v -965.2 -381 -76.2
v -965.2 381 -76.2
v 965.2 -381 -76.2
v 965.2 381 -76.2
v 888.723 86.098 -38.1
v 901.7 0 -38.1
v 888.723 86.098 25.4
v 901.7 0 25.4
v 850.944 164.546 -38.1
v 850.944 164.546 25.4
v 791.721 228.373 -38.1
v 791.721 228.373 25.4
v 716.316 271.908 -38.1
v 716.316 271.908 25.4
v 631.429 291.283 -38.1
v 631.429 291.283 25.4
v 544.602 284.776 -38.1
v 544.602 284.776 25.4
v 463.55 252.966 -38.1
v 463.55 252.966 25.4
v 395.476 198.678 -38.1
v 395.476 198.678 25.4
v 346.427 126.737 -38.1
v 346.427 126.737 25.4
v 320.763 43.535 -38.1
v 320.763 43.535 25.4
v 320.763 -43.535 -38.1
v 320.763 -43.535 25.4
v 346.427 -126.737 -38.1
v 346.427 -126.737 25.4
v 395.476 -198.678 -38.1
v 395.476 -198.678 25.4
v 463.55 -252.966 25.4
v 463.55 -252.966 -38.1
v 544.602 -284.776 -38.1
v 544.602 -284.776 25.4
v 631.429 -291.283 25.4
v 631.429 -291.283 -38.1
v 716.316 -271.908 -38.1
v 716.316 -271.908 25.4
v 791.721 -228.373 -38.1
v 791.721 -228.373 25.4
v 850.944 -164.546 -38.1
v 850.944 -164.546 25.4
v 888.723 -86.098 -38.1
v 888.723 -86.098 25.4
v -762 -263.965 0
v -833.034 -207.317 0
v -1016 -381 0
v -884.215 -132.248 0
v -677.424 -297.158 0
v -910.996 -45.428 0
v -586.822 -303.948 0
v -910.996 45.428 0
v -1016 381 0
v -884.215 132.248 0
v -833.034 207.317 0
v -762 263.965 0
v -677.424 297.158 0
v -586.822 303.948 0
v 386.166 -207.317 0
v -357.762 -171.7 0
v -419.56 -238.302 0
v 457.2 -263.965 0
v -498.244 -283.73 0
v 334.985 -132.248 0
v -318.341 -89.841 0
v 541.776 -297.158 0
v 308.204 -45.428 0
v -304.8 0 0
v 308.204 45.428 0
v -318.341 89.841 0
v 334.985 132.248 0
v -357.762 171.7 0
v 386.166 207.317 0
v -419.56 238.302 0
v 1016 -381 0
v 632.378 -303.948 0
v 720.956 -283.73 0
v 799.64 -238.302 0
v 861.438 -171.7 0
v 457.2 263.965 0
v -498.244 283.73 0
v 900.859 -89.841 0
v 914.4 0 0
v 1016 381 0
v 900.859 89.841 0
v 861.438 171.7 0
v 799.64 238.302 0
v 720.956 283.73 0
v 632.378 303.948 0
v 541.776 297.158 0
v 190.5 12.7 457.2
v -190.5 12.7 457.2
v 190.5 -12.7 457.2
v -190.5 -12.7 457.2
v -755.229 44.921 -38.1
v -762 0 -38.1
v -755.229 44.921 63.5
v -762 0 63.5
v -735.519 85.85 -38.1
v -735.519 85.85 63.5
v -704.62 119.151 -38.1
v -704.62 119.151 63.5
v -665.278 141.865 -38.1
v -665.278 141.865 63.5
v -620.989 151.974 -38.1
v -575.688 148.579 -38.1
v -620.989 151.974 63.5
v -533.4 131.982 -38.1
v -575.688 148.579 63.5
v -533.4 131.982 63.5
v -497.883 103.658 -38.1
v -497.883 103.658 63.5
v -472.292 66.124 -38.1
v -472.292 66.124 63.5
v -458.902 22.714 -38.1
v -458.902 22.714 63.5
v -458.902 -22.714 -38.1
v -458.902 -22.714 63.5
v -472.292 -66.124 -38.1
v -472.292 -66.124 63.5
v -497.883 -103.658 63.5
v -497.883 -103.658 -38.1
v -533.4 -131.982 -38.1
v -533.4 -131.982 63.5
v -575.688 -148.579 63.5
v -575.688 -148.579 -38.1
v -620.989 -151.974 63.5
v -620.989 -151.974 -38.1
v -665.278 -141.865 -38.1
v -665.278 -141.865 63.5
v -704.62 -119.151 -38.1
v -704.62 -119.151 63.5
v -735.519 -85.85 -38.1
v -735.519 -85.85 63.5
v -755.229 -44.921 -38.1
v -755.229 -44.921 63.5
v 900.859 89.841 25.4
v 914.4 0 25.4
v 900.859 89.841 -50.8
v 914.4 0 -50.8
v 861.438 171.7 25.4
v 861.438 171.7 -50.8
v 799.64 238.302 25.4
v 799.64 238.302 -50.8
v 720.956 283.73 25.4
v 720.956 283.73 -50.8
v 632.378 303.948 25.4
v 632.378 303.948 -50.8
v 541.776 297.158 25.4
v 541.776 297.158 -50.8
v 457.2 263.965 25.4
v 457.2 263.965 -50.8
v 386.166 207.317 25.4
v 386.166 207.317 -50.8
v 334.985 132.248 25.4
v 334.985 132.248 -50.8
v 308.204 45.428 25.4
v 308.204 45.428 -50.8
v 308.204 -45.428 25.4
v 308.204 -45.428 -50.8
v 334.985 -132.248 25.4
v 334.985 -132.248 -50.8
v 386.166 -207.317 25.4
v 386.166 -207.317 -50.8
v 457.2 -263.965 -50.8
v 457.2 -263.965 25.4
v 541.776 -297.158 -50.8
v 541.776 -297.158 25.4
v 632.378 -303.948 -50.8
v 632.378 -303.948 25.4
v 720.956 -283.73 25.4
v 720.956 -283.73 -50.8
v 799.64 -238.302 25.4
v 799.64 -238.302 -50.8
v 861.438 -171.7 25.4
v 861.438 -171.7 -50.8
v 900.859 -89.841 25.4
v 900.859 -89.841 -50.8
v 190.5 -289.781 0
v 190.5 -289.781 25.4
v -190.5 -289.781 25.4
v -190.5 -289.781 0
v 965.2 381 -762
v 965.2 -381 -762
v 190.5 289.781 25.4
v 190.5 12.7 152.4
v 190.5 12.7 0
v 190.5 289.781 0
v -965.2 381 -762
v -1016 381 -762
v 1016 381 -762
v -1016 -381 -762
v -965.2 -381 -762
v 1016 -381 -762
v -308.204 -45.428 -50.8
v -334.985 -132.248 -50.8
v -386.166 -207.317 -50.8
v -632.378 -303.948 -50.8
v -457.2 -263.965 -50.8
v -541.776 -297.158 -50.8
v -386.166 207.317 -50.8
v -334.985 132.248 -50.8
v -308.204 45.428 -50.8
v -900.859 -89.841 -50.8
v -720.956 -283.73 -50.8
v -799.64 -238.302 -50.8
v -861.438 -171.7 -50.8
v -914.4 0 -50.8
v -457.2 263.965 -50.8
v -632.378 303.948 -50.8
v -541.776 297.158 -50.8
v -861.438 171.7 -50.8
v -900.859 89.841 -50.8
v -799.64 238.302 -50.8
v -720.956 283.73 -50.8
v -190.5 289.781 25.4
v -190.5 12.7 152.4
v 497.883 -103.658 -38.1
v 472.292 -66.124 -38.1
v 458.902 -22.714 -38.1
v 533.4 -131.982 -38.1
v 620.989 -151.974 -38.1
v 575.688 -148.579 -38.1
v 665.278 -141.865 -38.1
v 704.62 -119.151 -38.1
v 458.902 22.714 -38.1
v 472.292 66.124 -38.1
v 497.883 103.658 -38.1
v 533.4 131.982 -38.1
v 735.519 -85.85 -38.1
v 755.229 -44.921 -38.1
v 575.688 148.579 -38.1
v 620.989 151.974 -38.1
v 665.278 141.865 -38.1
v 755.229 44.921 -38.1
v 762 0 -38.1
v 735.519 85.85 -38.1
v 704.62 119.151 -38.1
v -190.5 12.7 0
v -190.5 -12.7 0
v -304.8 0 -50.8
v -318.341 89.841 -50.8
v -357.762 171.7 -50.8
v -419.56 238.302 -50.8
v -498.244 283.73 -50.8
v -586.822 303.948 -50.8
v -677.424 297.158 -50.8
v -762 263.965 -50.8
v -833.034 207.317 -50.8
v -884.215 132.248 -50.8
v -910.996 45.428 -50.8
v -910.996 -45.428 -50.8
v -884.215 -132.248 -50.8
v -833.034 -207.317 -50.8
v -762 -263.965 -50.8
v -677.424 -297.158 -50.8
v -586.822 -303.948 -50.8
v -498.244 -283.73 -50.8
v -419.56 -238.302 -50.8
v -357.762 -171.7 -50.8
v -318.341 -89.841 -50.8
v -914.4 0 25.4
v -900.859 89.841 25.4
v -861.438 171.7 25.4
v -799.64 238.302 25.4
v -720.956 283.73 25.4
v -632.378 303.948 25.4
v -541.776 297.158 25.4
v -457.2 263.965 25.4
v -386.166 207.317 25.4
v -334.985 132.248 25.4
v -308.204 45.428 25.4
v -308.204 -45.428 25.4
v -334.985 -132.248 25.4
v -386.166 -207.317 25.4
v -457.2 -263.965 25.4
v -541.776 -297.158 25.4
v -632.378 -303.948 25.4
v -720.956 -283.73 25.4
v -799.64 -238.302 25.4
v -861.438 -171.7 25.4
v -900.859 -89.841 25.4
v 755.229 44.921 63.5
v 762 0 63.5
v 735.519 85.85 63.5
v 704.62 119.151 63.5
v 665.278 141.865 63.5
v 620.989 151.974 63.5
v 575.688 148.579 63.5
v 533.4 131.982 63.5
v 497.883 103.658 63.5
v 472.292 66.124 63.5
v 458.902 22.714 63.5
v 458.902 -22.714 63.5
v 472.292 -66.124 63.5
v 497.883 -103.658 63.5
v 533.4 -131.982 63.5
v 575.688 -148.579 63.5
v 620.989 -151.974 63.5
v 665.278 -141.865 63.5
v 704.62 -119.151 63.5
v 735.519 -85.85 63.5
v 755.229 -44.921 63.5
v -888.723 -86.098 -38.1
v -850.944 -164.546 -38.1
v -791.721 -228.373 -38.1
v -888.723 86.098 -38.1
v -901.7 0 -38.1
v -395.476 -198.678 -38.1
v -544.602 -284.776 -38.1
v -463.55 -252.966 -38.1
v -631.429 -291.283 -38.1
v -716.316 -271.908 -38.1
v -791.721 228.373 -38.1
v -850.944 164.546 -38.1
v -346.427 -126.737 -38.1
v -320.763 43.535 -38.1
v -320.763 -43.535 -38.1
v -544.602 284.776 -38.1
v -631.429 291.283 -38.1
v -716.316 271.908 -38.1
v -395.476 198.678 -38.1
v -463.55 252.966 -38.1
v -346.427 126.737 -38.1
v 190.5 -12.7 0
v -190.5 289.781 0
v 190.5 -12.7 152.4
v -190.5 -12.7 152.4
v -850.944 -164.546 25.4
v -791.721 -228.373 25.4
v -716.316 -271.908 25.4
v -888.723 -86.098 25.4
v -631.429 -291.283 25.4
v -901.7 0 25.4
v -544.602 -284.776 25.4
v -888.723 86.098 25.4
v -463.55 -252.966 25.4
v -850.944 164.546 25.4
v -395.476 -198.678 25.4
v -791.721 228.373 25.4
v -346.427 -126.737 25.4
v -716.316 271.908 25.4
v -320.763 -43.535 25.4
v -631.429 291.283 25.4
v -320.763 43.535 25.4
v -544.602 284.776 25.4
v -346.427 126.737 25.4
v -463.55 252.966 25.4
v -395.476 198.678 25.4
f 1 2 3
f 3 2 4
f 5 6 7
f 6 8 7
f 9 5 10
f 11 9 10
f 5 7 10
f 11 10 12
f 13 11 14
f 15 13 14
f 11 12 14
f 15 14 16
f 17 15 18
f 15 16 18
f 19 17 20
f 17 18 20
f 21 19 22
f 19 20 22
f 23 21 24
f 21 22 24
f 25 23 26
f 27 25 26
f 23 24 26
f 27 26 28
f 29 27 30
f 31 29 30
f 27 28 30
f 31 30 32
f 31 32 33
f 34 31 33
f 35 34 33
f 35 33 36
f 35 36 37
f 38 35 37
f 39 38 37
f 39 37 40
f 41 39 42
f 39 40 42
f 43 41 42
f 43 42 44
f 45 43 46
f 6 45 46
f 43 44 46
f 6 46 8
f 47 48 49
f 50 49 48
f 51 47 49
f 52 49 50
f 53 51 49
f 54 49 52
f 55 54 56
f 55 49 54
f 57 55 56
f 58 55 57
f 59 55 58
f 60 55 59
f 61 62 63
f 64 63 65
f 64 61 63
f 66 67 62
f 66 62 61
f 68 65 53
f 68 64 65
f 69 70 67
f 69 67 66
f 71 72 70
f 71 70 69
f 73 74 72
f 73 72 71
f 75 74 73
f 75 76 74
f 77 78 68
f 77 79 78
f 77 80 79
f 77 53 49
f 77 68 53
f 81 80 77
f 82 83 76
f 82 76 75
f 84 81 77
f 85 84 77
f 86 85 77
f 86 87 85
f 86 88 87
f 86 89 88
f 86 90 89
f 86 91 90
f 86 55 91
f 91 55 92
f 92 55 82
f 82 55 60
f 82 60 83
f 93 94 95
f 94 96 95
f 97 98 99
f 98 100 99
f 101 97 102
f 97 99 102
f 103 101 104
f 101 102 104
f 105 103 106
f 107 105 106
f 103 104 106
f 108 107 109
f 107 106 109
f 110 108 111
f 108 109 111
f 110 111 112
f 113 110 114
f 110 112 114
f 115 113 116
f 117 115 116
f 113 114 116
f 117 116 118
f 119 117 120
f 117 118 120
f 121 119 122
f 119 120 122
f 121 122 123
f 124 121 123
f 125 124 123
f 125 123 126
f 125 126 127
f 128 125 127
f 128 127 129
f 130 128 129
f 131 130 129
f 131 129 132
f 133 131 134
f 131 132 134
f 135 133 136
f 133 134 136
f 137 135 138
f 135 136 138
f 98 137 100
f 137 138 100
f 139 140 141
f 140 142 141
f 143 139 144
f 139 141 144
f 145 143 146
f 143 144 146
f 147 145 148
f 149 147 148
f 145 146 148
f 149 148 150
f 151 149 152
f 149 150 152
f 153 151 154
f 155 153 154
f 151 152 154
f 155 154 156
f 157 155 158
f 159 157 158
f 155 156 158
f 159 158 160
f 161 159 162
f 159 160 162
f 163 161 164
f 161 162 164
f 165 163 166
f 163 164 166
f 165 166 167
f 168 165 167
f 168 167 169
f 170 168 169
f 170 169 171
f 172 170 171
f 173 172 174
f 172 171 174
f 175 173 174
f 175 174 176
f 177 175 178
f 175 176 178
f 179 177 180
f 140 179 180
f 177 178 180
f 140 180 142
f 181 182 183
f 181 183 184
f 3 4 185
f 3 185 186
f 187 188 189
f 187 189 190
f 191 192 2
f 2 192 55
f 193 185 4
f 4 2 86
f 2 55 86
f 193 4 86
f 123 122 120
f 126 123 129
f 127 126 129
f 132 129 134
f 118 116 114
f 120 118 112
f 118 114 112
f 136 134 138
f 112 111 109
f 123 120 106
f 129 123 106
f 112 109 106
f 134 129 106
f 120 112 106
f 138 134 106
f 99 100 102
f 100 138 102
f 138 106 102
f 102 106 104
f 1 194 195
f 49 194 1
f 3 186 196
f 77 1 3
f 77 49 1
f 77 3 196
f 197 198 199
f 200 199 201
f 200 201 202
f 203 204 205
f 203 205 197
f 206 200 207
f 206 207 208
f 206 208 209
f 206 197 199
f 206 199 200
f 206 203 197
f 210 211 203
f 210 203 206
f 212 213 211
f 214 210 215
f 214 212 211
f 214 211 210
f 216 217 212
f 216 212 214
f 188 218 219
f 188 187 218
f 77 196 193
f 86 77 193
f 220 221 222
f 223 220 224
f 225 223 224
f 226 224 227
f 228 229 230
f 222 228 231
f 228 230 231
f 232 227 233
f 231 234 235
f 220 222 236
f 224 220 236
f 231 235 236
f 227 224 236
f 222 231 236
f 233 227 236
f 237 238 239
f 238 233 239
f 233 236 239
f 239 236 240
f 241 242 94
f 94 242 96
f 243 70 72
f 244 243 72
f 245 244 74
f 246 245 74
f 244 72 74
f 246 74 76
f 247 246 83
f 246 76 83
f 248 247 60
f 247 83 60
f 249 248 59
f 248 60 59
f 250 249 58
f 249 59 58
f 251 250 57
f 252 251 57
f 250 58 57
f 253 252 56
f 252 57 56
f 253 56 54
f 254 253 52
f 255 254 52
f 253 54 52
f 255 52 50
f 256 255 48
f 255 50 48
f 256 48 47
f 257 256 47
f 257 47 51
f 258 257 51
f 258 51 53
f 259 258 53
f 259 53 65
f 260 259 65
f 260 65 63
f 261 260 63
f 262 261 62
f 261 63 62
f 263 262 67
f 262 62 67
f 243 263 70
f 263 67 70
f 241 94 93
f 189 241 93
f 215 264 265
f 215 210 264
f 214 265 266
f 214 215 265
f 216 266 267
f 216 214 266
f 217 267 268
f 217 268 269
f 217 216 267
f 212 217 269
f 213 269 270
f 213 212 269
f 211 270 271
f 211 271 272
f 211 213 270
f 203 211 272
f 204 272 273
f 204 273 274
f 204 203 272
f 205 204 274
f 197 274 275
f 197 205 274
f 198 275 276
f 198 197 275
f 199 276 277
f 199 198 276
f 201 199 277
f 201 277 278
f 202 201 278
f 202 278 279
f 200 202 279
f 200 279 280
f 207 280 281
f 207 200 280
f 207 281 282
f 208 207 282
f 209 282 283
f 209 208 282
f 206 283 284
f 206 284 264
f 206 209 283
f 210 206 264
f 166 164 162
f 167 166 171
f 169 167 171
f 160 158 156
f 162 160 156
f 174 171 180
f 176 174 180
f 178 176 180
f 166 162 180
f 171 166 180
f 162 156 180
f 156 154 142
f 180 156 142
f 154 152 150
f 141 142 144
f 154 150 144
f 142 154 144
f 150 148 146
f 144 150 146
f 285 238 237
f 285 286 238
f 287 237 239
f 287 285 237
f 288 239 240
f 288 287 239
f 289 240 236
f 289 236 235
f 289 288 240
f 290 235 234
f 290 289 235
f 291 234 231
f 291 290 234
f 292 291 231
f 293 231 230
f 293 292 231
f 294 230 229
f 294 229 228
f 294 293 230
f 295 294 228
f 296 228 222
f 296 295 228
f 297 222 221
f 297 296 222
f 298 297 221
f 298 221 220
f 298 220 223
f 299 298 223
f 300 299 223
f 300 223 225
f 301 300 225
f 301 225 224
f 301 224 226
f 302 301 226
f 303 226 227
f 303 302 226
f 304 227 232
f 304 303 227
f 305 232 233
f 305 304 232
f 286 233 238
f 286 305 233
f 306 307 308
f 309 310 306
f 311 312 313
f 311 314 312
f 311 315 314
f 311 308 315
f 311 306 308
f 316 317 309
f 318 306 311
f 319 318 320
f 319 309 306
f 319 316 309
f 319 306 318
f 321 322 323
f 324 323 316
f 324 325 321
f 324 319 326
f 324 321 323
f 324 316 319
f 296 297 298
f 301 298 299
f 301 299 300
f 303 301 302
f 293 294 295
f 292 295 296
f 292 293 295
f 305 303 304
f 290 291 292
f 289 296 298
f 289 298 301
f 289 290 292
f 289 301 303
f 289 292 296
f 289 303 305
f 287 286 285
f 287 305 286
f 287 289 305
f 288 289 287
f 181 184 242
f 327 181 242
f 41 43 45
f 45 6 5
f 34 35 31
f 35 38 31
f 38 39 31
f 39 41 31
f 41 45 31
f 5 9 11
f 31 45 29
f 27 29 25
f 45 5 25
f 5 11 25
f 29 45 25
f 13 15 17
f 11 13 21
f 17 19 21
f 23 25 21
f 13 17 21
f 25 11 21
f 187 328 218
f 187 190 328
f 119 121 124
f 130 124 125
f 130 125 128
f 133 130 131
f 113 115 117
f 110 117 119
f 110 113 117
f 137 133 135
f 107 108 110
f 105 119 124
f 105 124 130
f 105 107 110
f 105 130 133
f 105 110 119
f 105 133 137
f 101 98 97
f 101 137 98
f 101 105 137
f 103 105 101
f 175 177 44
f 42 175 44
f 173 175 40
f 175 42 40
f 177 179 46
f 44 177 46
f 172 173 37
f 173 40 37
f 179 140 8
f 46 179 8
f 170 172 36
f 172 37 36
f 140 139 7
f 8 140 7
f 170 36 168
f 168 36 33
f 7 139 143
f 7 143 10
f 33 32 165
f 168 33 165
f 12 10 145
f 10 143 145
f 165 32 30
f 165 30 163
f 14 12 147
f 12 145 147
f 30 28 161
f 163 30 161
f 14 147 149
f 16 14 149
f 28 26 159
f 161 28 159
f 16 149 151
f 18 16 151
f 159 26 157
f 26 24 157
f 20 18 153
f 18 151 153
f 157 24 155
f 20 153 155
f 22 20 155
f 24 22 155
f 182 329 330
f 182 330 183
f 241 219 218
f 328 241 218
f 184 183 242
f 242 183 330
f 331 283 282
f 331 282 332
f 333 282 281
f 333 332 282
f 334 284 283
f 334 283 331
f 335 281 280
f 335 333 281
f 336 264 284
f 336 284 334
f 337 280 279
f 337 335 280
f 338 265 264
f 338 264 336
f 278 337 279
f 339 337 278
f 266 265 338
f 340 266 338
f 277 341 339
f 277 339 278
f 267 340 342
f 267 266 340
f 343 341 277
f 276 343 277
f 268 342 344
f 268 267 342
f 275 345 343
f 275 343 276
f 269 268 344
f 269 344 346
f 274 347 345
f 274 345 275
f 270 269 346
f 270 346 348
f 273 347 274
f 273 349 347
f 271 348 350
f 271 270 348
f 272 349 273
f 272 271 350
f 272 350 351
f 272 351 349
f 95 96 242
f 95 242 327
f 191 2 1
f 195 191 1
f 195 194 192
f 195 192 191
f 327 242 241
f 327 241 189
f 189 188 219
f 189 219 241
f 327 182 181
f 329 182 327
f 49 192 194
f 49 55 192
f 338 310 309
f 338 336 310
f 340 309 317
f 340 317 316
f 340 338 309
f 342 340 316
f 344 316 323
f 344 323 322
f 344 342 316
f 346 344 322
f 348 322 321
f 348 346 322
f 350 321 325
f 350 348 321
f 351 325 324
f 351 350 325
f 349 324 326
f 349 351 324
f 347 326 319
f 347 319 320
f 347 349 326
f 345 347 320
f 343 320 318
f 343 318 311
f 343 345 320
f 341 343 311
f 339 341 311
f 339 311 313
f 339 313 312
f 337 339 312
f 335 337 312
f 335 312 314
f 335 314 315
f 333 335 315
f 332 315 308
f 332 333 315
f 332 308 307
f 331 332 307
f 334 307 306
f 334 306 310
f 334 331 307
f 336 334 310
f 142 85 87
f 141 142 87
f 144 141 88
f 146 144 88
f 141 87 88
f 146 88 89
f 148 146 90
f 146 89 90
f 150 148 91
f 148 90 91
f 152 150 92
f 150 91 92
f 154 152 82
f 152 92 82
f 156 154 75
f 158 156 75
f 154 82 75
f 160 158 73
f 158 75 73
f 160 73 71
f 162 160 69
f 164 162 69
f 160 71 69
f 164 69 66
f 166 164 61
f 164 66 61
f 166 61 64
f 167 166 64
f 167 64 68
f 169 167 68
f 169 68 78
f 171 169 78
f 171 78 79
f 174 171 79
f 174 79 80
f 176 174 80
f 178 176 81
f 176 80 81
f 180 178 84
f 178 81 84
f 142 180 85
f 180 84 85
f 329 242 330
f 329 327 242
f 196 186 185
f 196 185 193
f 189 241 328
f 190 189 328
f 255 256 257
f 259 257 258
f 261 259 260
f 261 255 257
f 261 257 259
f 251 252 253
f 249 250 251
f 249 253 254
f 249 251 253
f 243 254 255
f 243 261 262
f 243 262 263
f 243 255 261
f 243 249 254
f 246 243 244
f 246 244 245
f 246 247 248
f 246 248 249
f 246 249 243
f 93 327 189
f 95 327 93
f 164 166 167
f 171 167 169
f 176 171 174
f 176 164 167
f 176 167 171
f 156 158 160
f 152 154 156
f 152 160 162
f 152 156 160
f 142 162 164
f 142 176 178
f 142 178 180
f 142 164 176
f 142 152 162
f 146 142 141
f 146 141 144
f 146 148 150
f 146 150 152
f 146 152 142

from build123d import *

# Parameters (mm, degrees)
F0_W           = 2032
F0_H           = 762
F1_DEPTH       = 76.2
F2_W           = 50.8
F2_H           = 762
F3_DEPTH       = 685.8
F6_W           = 152.4
F6_H           = 101.6
F10_DEPTH      = 127
F10_DEPTH_BACK = 127
F11_R          = 304.8
F12_DEPTH      = 50.8
F16_DEPTH      = 12.7
F16_DEPTH_BACK = 12.7
F17_W          = 355.6
F17_H          = 431.8
F18_DEPTH      = 6.35
F18_DEPTH_BACK = 6.35
F21_W          = 381
F21_H          = 457.2
F22_DEPTH      = 12.7
F22_DEPTH_BACK = 12.7
F24_DEPTH      = 190.5
F24_DEPTH_BACK = 190.5


with BuildPart() as f1:
    # F0 (on Top) → F1 (new body)
    with BuildSketch(Plane.XY):
        Rectangle(F0_W, F0_H)
    extrude(amount=-F1_DEPTH)

    # F2 (on face) → F3 (join)
    with BuildSketch(Plane(origin=(0, 0, -76.2), x_dir=(1, 0, 0), z_dir=(0, 0, -1))):
        with Locations((-990.6, 0)):
            Rectangle(F2_W, F2_H)
        with Locations((990.6, 0)):
            Rectangle(F2_W, F2_H)
    extrude(amount=F3_DEPTH)

    # F11 (on face) → F12 (cut)
    with BuildSketch(Plane.XY):
        with Locations((-609.6, 0)):
            Circle(F11_R)
        with Locations((609.6, 0)):
            Circle(F11_R)
    extrude(amount=-F12_DEPTH, mode=Mode.SUBTRACT)


with BuildPart() as f5:
    # F4 (on Front) → F5 (revolve)
    with BuildSketch(Plane.XZ):
        Polygon((-914.4, -50.8), (-609.6, -50.8), (-609.6, -38.1), (-901.7, -38.1), (-901.7, 25.4), (-914.4, 25.4), align=None)
    revolve(axis=Axis((-609.6, 0, -44.45), (0, 0, -1)))


with BuildPart() as f7:
    # F6 (on Front) → F7 (revolve)
    with BuildSketch(Plane.XZ):
        with Locations((-685.8, 12.7)):
            Rectangle(F6_W, F6_H)
    revolve(axis=Axis((-609.6, 0, 12.7), (0, 0, -1)))


with BuildPart() as f8_1:
    # F8: instance of F7
    add(f7.part.mirror(Plane.YZ))


with BuildPart() as f8_2:
    # F8: instance of F5
    add(f5.part.mirror(Plane.YZ))


with BuildPart() as f10:
    # F9 (on Right) → F10 (new body, two sides)
    with BuildSketch(Plane.YZ) as f10_sk:
        Polygon((50.8, 152.4), (0, 152.4), (-50.8, 152.4), (-327.8812877117, 25.4), (-327.8812877117, 0), (0, 0), (327.8812877117, 0), (327.8812877117, 25.4), align=None)
    extrude(amount=F10_DEPTH)
    extrude(f10_sk.sketch, amount=-F10_DEPTH_BACK)


with BuildPart() as f16:
    # F15 (on Front) → F16 (new body, two sides)
    with BuildSketch(Plane.XZ) as f16_sk:
        Polygon((-203.2, 457.2), (-203.2, 0), (-177.8, 0), (0, 0), (0, 25.4), (-177.8, 25.4), (-177.8, 431.8), (0, 431.8), (0, 457.2), align=None)
        Polygon((203.2, 457.2), (0, 457.2), (0, 431.8), (177.8, 431.8), (177.8, 25.4), (0, 25.4), (0, 0), (177.8, 0), (203.2, 0), align=None)
    extrude(amount=F16_DEPTH)
    extrude(f16_sk.sketch, amount=-F16_DEPTH_BACK)


with BuildPart() as f18:
    # F17 (on Front) → F18 (new body, two sides)
    with BuildSketch(Plane.XZ) as f18_sk:
        with Locations((0, 215.9)):
            Rectangle(F17_W, F17_H)
    extrude(amount=F18_DEPTH)
    extrude(f18_sk.sketch, amount=-F18_DEPTH_BACK)


with BuildPart() as f22:
    # F21 (on Front) → F22 (new body, two sides)
    with BuildSketch(Plane.XZ) as f22_sk:
        with Locations((0, 228.6)):
            Rectangle(F21_W, F21_H)
    extrude(amount=F22_DEPTH)
    extrude(f22_sk.sketch, amount=-F22_DEPTH_BACK)


with BuildPart() as f24:
    # F23 (on Right) → F24 (new body, two sides)
    with BuildSketch(Plane.YZ) as f24_sk:
        Polygon((289.7812877117, 25.4), (12.7, 152.4), (12.7, 0), (289.7812877117, 0), align=None)
    extrude(amount=F24_DEPTH)
    extrude(f24_sk.sketch, amount=-F24_DEPTH_BACK)


with BuildPart() as f24b:
    # F23 (on Right) → F24, piece 2 (new body, two sides)
    with BuildSketch(Plane.YZ) as f24_2_sk:
        Polygon((-12.7, 0), (-12.7, 152.4), (-289.7812877117, 25.4), (-289.7812877117, 0), align=None)
    extrude(amount=F24_DEPTH)
    extrude(f24_2_sk.sketch, amount=-F24_DEPTH_BACK)


solid = Compound([f1.part, f5.part, f7.part, f8_1.part, f8_2.part, f22.part, f24.part, f24b.part])
